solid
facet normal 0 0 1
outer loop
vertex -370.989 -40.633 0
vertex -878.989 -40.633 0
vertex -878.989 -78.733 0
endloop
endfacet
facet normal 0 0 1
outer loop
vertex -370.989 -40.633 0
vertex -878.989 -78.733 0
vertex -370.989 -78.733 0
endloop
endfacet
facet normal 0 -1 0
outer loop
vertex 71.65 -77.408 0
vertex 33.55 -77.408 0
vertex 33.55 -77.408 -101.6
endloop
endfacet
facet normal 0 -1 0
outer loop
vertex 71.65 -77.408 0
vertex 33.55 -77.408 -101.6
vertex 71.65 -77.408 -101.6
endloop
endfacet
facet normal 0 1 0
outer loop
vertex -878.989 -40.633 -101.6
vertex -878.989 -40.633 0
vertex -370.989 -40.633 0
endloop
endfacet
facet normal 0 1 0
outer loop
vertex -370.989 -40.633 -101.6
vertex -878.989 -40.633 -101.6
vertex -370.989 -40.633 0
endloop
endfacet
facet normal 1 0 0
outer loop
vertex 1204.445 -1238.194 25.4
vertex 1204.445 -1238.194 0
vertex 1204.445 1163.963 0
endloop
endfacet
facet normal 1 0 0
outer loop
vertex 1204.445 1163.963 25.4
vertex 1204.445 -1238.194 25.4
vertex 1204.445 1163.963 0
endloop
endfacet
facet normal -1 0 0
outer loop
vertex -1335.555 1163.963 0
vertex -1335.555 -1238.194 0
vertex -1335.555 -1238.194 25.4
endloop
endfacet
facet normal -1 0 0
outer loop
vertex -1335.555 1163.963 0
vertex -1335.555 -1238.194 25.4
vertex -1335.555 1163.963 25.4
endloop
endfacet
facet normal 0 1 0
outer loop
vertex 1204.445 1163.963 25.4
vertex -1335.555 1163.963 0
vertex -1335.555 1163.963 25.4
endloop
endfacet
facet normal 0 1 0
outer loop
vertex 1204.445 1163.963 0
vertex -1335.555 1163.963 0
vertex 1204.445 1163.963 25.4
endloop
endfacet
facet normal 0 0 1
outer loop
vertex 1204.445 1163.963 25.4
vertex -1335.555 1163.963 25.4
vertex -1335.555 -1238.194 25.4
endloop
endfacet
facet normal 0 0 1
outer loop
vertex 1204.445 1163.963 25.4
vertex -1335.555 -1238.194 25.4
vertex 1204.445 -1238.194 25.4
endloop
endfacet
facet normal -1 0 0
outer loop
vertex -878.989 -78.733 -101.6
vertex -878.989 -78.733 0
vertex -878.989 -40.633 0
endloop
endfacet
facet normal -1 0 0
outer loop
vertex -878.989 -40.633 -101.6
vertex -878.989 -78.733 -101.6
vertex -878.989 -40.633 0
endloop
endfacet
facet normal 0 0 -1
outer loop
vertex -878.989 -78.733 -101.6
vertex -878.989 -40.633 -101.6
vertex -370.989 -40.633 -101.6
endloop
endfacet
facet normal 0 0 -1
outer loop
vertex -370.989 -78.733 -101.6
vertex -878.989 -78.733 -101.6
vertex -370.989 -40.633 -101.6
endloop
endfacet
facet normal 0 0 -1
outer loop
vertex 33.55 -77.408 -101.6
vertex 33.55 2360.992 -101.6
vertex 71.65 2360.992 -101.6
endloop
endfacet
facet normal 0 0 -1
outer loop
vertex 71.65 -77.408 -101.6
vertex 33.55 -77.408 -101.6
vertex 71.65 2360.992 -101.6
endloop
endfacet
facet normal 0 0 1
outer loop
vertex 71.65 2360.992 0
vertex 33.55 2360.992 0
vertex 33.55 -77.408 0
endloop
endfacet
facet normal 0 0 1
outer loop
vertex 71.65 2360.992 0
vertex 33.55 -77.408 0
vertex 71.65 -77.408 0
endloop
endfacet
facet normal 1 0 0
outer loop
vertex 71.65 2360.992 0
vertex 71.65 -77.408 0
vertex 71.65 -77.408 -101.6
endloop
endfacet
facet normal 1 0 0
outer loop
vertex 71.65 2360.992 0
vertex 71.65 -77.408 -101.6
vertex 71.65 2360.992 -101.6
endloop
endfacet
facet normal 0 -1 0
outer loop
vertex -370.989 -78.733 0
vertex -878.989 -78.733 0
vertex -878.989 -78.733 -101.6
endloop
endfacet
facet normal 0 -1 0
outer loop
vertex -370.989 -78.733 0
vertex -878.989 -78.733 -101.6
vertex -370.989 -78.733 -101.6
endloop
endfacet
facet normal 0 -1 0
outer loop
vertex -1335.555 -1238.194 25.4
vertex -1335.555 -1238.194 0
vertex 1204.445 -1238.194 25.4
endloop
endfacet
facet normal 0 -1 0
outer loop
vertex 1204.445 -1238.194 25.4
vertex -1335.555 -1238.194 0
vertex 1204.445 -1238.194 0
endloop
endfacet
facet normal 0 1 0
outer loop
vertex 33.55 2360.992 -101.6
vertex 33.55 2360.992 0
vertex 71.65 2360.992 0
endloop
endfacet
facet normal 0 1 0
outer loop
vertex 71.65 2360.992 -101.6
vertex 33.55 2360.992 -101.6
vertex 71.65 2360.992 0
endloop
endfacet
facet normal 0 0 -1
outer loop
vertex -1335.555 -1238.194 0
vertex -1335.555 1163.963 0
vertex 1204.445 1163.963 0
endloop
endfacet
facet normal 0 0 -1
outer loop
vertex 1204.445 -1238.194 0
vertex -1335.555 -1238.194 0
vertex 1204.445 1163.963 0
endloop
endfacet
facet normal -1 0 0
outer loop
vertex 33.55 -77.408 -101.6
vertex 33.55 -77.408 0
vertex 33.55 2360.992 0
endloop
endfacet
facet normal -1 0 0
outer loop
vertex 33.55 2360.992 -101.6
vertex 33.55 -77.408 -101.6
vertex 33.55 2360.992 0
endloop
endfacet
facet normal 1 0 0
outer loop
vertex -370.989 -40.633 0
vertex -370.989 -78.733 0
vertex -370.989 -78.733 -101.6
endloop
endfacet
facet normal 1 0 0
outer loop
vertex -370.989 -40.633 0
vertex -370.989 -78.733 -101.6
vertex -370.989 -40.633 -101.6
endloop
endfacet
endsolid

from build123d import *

# Parameters (mm, degrees)
F0_W     = 38.1
F0_H     = 2438.4
F1_DEPTH = 101.6
F2_W     = 508
F2_H     = 38.1
F3_DEPTH = 101.6
F4_W     = 2540
F4_H     = 2402.156334
F5_DEPTH = 25.4


with BuildPart() as f1:
    # F0 (on Top) → F1 (new body)
    with BuildSketch(Plane.XY):
        with Locations((52.599733, 1141.792141)):
            Rectangle(F0_W, F0_H)
    extrude(amount=-F1_DEPTH)


with BuildPart() as f3:
    # F2 (on Top) → F3 (new body)
    with BuildSketch(Plane.XY):
        with Locations((-624.988624, -59.68334)):
            Rectangle(F2_W, F2_H)
    extrude(amount=-F3_DEPTH)


with BuildPart() as f5:
    # F4 (on Top) → F5 (new body)
    with BuildSketch(Plane.XY):
        with Locations((-65.555312, -37.115365)):
            Rectangle(F4_W, F4_H)
    extrude(amount=F5_DEPTH)


solid = Compound([f1.part, f3.part, f5.part])
